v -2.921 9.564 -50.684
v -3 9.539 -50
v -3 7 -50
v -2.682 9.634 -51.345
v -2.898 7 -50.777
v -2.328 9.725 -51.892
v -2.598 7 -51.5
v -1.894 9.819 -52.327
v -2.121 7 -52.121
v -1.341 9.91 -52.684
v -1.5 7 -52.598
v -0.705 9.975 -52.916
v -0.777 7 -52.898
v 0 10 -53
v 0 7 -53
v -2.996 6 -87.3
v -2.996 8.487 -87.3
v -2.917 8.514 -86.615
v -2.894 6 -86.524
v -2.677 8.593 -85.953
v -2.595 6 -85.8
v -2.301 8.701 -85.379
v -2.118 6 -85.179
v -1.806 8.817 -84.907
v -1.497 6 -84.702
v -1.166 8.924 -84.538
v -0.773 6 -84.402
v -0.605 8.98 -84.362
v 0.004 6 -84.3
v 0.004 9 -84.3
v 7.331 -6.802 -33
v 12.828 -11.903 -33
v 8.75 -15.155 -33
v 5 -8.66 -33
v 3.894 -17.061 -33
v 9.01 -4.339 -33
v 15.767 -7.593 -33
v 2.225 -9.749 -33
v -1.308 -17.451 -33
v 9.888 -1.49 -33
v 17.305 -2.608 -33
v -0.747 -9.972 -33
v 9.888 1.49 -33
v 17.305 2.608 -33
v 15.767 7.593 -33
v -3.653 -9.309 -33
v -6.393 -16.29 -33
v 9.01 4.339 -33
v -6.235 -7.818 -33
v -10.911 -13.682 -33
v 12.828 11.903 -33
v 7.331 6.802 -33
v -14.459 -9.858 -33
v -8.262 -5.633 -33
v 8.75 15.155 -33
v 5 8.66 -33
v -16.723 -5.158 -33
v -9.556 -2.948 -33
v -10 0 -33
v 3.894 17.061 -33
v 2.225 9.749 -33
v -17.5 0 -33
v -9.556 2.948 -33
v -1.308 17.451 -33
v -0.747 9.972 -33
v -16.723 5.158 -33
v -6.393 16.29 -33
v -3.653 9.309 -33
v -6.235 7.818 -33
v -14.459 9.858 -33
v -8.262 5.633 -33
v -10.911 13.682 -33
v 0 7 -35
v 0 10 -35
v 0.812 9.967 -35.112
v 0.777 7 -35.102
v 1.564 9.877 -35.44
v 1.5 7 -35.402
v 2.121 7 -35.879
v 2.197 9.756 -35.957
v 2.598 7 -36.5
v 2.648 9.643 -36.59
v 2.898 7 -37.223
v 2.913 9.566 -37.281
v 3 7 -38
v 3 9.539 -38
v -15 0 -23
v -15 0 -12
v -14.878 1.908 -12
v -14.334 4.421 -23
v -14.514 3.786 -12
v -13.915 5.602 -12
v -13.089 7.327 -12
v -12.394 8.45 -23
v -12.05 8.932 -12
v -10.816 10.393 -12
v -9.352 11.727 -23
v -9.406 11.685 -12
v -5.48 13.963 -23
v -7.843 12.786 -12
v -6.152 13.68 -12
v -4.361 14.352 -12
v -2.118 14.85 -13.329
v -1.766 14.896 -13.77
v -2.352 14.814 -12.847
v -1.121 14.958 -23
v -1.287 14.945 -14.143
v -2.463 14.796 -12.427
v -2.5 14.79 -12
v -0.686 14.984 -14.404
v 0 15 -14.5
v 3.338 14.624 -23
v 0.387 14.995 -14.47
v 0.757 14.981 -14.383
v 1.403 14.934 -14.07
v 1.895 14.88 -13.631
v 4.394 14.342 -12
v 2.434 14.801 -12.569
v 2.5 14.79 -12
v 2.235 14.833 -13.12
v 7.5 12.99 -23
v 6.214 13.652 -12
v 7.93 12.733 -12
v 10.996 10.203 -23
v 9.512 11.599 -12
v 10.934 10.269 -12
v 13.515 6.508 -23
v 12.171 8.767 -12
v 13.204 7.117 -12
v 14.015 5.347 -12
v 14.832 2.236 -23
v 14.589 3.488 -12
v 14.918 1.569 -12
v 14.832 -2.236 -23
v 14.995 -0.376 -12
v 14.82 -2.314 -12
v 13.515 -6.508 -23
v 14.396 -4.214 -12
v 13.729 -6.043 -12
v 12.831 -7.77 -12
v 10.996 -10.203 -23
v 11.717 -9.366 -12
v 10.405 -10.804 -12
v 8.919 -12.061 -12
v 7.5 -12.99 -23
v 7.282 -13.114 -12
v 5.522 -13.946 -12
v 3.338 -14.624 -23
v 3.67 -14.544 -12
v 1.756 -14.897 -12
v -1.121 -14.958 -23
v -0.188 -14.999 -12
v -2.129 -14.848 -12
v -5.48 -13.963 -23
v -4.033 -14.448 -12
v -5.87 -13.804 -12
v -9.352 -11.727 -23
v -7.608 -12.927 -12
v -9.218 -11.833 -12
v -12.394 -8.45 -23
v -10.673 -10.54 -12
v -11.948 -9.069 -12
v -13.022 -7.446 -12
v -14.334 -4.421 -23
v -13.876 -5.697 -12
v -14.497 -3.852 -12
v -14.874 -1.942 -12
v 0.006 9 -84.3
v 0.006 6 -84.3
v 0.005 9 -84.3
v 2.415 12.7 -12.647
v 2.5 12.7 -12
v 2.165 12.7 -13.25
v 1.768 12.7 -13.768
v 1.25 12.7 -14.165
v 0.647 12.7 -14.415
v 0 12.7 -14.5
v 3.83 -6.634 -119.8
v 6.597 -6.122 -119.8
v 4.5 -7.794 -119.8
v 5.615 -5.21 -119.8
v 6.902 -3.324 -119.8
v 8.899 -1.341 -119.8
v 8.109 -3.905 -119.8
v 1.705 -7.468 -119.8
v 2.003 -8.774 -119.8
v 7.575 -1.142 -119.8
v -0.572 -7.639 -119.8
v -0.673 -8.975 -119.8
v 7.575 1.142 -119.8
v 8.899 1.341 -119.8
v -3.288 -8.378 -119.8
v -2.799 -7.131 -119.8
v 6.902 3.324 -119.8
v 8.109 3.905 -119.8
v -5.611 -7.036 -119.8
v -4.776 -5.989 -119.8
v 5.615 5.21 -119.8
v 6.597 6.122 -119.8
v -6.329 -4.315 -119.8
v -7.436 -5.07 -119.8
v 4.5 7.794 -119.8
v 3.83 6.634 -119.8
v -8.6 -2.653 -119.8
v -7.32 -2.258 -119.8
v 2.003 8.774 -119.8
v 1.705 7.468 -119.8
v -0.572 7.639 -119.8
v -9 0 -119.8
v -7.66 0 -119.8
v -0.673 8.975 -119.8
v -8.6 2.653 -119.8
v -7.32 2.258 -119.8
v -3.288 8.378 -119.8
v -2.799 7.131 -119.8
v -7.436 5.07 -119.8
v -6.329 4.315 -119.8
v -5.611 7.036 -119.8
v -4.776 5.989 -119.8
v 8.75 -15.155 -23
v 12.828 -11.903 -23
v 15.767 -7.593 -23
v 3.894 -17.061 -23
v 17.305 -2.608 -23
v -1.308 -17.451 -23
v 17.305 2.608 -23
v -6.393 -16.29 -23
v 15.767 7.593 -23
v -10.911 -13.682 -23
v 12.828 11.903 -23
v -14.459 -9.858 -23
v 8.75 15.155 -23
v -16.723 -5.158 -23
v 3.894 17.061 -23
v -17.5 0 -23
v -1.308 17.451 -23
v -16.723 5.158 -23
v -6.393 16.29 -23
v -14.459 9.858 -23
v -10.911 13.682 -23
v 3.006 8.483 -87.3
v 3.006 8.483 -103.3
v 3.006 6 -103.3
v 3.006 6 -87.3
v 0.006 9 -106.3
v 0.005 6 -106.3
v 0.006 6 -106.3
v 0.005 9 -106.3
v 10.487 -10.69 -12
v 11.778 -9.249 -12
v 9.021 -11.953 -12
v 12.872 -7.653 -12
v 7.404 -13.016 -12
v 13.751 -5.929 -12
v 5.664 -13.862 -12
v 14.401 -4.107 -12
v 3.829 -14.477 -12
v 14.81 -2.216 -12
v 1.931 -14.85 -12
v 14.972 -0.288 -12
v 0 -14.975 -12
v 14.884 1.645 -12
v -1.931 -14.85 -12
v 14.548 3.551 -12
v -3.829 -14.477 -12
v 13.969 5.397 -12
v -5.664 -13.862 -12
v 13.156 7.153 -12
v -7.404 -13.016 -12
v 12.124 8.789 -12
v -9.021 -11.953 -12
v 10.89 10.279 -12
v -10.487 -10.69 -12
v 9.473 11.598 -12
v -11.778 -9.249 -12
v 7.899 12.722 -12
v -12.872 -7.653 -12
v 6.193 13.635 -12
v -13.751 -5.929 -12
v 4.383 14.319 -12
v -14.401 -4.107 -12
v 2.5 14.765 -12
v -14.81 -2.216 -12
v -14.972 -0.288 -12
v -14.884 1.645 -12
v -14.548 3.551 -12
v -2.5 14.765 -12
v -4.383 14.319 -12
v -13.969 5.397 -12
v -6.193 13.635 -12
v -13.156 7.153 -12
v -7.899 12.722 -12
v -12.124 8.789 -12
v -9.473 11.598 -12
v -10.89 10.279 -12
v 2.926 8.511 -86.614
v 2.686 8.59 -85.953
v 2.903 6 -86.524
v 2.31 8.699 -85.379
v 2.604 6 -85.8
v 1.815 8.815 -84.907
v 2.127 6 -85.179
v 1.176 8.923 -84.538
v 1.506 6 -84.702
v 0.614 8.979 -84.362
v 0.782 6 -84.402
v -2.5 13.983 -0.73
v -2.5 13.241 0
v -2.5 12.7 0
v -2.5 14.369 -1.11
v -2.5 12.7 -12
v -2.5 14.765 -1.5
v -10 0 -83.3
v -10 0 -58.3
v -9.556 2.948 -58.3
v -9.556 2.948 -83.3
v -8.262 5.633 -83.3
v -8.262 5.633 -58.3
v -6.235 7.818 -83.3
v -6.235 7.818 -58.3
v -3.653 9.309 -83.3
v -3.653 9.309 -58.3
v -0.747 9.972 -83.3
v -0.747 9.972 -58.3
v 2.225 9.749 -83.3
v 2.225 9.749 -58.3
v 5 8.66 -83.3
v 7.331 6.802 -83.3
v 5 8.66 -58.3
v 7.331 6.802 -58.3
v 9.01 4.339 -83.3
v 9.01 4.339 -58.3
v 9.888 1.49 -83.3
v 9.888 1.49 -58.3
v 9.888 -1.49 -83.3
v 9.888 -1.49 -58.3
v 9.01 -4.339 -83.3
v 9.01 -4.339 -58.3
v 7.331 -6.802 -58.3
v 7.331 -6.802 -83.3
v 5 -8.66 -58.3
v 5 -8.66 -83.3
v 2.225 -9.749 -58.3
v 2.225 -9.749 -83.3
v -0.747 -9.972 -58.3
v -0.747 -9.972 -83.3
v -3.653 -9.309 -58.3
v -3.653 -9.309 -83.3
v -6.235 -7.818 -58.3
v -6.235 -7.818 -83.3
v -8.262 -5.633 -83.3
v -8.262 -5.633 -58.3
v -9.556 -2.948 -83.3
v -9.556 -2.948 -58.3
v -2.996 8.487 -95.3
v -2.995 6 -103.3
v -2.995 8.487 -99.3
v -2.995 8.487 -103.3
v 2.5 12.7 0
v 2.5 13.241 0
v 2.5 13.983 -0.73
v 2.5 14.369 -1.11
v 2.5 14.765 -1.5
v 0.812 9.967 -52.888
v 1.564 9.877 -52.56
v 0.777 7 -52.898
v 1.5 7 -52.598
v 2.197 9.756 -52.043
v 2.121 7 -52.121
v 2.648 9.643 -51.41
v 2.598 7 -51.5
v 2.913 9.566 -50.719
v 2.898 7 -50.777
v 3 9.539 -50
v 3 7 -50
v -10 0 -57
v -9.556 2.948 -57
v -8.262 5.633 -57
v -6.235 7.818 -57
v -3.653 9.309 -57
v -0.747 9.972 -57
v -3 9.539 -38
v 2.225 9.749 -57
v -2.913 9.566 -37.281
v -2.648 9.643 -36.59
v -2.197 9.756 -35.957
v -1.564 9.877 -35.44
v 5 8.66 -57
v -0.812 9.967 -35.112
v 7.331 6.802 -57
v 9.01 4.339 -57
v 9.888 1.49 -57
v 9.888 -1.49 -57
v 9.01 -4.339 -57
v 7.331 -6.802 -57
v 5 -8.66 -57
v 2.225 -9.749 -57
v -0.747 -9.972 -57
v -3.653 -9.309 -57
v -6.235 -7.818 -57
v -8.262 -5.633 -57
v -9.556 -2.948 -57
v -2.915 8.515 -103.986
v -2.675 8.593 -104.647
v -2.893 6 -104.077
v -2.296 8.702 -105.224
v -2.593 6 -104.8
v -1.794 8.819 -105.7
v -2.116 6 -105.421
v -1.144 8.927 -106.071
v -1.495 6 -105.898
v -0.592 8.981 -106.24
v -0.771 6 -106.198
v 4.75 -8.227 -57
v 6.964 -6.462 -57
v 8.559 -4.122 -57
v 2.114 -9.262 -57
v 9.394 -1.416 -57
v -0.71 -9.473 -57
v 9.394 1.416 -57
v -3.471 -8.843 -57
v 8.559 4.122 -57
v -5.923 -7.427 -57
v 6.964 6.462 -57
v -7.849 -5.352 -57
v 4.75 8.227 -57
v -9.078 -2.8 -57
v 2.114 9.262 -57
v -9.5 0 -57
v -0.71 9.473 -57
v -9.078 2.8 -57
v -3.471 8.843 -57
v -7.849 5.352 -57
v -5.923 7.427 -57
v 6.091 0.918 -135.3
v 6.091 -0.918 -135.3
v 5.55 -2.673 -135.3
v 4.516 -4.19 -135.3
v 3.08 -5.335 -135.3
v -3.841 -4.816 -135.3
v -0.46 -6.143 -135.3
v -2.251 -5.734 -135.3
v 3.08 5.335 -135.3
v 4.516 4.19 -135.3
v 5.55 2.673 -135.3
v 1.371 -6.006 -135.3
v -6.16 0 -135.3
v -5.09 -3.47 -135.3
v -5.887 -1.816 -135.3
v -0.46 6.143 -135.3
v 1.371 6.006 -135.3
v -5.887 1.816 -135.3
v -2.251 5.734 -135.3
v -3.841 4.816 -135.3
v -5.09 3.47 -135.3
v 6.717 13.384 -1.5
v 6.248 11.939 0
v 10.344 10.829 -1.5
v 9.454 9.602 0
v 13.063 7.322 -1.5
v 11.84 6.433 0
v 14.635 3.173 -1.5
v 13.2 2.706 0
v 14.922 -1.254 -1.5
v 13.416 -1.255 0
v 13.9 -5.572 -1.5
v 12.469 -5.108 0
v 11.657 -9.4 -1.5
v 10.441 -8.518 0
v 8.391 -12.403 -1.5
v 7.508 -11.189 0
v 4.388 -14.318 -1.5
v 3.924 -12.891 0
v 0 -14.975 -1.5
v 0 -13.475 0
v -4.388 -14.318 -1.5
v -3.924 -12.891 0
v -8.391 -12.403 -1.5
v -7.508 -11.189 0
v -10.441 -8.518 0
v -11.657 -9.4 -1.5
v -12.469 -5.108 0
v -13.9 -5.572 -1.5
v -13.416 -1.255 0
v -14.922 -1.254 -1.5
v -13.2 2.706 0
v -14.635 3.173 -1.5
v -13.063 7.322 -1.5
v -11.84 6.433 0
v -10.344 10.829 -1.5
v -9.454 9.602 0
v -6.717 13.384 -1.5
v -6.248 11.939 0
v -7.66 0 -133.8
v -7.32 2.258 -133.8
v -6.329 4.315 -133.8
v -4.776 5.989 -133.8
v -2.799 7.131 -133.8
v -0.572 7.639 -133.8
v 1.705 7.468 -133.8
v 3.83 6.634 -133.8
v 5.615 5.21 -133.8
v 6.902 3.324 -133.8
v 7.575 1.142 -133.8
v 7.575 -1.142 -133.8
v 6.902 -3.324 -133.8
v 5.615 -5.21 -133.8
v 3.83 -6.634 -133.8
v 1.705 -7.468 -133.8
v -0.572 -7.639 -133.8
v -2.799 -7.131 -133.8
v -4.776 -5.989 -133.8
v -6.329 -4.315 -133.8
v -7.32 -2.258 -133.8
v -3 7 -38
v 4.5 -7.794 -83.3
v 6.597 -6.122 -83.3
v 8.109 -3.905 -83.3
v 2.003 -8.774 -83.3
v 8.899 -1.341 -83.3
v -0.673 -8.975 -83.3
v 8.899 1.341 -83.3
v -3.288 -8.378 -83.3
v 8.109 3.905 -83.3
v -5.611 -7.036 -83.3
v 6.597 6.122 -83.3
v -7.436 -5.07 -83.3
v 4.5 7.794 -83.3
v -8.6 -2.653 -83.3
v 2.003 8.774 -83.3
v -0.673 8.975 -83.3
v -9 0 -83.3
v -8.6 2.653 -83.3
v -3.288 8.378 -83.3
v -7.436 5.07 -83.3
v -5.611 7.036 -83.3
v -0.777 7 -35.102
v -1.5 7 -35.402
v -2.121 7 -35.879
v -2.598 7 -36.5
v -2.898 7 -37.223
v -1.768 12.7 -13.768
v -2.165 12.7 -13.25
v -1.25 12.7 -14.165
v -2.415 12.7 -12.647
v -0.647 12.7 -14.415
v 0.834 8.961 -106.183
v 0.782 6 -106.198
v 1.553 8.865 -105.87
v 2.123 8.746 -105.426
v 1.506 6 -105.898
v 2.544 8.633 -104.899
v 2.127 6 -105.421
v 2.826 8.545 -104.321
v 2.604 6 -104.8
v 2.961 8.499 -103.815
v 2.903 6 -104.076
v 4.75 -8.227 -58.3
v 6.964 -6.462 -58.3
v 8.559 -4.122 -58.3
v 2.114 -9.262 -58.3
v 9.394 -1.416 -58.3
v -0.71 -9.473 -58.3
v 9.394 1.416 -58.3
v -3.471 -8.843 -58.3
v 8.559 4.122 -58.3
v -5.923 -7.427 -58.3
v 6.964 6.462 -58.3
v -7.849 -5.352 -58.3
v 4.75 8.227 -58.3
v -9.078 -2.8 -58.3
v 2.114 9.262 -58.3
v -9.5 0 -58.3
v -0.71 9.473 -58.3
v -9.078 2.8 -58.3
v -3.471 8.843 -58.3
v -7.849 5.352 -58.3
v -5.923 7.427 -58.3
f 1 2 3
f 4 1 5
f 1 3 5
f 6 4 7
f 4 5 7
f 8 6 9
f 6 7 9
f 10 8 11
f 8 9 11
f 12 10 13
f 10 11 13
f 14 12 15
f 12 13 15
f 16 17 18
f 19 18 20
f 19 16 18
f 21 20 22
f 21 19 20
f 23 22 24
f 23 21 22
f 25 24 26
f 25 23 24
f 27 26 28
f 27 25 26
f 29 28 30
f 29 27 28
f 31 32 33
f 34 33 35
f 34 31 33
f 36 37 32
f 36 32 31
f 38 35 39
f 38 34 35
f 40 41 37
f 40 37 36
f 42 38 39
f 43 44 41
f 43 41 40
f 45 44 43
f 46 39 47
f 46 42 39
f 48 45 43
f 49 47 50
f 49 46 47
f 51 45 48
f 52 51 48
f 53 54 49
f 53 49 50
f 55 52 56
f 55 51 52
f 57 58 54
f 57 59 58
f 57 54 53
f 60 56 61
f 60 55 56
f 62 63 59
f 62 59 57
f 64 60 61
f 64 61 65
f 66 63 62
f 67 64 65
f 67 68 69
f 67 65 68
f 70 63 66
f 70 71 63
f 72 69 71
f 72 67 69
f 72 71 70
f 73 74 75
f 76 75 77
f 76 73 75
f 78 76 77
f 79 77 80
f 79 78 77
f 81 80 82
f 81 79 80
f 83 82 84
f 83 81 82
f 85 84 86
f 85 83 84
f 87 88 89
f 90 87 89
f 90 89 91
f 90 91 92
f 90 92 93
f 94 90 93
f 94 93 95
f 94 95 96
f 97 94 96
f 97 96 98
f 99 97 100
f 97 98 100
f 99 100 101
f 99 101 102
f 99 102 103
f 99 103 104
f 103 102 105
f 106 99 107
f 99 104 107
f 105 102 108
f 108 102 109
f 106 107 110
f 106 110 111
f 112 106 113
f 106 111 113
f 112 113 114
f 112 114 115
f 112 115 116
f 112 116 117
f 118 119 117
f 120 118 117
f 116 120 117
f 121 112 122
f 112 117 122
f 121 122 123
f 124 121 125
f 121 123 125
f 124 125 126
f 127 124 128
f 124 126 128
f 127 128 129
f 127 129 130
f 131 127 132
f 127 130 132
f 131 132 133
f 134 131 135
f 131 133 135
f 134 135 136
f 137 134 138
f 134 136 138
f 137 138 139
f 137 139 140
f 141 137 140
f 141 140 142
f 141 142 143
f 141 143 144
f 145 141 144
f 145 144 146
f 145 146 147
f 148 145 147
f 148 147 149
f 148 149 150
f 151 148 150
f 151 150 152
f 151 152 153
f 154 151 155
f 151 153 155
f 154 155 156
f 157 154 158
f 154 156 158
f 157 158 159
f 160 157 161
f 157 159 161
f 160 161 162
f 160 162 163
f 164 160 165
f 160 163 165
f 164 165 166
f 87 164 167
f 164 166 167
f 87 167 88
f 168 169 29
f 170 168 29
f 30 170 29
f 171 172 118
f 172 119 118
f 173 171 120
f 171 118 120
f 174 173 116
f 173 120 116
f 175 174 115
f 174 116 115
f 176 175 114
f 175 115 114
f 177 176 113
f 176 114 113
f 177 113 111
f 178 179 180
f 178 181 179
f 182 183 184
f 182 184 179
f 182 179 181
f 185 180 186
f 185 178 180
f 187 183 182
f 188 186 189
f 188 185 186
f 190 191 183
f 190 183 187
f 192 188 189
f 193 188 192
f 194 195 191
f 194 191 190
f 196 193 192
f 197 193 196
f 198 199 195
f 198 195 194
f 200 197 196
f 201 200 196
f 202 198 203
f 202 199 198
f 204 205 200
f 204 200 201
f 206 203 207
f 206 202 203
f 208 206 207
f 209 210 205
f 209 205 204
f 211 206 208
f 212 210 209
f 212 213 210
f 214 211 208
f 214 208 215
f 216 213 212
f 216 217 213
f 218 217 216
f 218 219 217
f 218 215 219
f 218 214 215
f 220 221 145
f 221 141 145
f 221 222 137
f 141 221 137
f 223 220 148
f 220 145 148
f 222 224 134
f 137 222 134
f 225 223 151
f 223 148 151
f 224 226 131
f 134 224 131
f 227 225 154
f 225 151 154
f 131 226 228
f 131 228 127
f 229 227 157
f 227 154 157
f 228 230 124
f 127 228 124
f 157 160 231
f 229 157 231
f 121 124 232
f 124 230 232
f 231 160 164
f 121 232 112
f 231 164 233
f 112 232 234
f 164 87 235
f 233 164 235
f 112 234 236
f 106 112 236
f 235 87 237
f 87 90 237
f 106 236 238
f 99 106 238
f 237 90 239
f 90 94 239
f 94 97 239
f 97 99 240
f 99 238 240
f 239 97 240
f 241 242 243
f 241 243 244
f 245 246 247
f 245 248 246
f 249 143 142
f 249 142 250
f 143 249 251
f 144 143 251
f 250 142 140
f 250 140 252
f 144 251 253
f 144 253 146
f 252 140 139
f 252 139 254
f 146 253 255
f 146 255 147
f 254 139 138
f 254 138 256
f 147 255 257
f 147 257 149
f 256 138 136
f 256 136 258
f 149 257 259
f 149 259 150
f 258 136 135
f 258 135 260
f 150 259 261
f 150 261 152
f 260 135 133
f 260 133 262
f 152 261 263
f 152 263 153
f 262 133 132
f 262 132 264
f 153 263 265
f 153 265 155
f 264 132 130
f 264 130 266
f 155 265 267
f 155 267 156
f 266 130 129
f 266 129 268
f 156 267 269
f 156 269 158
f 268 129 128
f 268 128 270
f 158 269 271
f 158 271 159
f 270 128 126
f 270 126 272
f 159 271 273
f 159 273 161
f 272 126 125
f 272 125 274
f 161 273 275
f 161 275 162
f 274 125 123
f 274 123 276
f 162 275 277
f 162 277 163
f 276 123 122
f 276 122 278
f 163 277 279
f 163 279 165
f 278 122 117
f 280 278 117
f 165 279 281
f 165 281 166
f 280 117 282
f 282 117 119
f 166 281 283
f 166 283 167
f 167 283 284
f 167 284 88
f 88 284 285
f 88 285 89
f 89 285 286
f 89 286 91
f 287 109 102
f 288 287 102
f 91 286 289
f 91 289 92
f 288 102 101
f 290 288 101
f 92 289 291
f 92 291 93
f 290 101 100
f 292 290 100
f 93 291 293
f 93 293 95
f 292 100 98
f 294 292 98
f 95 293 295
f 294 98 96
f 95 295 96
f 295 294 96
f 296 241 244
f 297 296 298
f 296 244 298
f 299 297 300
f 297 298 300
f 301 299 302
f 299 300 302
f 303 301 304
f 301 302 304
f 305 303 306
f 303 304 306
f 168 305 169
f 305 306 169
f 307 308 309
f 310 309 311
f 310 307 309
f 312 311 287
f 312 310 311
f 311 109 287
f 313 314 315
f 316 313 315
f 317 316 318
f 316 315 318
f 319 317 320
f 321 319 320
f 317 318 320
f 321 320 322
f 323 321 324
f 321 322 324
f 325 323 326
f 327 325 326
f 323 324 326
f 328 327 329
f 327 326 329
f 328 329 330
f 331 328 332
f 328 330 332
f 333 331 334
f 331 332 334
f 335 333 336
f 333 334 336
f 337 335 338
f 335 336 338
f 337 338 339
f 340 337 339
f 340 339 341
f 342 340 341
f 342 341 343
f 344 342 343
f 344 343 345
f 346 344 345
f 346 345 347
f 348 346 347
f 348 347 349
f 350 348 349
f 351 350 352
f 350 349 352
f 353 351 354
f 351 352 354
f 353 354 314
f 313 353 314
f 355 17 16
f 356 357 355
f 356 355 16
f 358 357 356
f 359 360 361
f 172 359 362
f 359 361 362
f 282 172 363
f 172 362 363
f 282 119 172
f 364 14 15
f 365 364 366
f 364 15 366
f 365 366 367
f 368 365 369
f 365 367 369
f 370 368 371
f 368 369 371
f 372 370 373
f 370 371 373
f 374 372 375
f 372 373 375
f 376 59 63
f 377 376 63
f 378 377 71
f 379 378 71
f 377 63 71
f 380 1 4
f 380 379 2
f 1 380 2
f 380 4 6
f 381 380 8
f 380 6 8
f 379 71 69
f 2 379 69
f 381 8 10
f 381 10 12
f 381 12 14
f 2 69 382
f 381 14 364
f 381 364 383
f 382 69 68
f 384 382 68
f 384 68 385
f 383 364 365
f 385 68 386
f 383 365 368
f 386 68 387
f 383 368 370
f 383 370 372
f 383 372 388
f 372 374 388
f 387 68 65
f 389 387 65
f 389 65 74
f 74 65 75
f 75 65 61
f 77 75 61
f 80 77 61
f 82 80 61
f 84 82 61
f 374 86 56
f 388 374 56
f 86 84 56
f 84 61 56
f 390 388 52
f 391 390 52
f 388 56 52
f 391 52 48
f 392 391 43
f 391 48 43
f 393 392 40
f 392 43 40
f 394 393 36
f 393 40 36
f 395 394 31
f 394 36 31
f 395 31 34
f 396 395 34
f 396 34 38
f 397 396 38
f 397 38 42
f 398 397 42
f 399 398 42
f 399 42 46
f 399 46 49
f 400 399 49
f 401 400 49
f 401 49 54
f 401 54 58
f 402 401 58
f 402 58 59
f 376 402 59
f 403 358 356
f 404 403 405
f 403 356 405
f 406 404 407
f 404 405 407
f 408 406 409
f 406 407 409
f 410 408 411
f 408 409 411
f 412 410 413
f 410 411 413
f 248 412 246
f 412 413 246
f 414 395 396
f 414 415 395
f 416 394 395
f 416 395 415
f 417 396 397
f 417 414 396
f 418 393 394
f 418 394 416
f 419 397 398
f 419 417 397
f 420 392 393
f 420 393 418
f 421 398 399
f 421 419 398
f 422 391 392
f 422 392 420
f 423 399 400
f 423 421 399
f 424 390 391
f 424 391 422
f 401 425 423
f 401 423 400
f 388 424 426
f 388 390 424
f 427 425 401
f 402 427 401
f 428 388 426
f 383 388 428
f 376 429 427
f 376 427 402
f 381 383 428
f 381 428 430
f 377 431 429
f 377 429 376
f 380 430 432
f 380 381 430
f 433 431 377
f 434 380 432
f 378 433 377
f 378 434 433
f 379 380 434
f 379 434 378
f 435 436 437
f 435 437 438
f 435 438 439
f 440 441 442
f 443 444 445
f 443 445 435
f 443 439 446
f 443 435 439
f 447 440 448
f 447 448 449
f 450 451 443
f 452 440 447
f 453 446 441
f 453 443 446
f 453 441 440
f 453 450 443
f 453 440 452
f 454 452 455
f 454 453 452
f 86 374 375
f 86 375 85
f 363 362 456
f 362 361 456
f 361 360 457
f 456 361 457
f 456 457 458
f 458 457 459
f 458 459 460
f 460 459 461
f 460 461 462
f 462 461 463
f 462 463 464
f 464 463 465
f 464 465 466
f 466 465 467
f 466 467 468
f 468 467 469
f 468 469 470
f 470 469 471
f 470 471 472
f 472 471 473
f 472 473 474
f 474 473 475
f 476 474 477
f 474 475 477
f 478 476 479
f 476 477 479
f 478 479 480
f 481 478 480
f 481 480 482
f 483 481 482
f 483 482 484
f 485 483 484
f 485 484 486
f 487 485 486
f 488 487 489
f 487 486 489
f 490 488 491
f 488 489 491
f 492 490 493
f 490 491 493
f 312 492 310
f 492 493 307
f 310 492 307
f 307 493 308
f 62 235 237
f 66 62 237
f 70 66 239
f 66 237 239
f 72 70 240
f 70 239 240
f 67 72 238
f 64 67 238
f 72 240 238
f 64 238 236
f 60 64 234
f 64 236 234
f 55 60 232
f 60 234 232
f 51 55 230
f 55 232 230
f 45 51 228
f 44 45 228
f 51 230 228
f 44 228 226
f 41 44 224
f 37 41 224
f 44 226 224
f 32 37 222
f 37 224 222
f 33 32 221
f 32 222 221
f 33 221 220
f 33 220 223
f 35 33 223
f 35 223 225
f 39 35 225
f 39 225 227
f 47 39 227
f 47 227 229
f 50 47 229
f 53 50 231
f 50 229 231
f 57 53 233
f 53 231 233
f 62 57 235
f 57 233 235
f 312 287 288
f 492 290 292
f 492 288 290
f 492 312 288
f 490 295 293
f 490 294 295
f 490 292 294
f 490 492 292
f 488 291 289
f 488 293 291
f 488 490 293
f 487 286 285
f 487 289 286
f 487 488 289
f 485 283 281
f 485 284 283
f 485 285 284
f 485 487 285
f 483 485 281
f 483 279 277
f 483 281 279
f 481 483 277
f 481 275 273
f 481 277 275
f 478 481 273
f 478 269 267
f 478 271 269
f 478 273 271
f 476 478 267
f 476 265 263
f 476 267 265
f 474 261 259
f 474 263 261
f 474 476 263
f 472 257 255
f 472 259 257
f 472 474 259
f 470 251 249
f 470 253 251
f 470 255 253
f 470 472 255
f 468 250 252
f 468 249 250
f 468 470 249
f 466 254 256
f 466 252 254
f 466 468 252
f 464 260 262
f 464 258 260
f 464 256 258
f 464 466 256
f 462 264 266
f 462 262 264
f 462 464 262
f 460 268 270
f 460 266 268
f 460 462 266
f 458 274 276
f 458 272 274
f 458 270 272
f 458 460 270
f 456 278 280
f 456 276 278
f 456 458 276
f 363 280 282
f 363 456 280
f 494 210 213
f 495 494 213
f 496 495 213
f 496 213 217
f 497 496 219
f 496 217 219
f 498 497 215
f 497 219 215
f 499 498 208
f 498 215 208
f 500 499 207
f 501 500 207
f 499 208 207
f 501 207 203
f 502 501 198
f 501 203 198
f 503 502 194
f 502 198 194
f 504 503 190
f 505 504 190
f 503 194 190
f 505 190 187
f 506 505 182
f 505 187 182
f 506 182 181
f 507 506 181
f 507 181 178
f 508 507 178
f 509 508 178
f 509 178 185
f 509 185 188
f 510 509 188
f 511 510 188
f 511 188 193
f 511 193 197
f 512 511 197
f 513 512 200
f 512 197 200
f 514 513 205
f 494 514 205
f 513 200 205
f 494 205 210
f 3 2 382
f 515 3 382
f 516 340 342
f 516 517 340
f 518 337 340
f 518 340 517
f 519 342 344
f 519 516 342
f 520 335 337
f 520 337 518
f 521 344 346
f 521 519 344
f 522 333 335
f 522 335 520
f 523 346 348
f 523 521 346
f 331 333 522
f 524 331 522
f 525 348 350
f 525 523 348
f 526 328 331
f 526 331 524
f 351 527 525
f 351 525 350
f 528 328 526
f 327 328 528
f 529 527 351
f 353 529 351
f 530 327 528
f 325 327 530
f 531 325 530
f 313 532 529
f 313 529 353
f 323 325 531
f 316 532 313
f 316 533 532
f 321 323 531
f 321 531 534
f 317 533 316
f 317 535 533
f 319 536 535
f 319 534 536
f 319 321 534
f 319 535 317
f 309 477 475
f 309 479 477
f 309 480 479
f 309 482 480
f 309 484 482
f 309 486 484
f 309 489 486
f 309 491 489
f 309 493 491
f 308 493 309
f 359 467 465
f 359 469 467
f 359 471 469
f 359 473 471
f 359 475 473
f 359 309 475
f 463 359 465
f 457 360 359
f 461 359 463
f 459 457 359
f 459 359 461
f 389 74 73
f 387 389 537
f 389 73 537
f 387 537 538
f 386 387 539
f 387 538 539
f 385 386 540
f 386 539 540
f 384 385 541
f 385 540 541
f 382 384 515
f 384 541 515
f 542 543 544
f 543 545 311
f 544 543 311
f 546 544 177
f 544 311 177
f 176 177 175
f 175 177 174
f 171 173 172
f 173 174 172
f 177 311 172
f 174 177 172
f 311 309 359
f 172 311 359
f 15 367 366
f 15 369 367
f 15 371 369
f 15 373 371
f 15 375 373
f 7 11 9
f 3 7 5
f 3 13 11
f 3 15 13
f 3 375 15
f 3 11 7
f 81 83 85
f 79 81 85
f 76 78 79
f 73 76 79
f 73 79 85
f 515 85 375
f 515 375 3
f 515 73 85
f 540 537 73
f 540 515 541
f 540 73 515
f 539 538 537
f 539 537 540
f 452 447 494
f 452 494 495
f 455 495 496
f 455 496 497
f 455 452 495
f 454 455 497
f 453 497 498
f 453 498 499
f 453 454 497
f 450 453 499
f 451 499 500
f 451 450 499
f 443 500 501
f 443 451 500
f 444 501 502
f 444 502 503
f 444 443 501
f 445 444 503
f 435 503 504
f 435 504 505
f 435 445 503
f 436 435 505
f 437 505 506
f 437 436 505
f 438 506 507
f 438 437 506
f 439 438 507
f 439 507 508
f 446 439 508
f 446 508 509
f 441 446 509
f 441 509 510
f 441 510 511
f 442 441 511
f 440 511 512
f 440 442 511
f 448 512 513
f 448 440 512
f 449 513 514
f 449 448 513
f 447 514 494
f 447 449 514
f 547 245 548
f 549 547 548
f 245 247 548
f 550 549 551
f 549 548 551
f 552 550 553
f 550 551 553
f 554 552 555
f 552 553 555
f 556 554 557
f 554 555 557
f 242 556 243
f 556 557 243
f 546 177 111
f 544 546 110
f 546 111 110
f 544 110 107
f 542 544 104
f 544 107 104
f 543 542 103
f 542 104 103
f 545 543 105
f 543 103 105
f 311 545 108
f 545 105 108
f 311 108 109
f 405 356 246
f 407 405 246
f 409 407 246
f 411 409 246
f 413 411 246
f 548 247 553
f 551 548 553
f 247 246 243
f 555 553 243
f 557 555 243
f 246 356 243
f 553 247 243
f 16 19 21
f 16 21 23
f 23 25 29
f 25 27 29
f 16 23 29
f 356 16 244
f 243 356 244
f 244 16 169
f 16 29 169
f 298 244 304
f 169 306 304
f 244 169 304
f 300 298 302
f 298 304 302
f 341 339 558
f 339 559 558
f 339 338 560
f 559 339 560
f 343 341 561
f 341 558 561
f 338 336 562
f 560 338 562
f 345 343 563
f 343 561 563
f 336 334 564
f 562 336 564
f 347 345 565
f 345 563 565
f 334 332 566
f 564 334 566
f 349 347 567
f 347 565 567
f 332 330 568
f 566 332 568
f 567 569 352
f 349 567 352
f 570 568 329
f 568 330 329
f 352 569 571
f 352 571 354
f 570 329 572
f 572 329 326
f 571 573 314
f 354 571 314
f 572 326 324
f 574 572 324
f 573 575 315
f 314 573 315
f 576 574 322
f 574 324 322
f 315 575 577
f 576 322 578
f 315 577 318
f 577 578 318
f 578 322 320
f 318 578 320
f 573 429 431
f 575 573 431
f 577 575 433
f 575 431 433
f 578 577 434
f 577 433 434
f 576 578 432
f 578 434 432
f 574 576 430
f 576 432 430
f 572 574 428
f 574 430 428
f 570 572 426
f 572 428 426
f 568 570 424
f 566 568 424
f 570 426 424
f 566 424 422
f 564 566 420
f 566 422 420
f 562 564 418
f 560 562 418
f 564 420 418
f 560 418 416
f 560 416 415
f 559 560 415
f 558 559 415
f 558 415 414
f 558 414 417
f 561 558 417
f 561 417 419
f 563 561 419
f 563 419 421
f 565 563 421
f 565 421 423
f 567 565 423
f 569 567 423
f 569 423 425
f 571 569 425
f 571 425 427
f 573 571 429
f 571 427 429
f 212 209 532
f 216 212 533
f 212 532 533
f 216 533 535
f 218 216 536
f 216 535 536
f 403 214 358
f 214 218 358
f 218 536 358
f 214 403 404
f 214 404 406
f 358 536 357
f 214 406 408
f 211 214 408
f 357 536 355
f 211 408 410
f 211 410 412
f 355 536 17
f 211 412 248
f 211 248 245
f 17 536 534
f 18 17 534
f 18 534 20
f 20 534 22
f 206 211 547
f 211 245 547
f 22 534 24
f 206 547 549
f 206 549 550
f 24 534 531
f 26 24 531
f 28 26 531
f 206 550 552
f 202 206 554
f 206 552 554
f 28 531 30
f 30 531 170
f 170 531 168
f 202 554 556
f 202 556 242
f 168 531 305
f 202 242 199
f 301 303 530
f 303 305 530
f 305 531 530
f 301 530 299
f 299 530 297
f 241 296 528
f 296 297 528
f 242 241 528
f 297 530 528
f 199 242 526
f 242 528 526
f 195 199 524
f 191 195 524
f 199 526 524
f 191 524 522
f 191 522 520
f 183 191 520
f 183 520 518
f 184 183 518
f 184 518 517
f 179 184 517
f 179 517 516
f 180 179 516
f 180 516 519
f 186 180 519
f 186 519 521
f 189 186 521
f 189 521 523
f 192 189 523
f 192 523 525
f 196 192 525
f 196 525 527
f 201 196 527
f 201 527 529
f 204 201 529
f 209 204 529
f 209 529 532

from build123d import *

# Parameters (mm, degrees)
SKETCH1_R          = 14.975
EXTRUDE1_DEPTH     = 12
SKETCH2_R          = 15
EXTRUDE2_DEPTH     = 11
SKETCH3_R          = 17.5
EXTRUDE3_DEPTH     = 10
SKETCH4_R          = 10
EXTRUDE4_DEPTH     = 24
SKETCH5_R          = 9.5
EXTRUDE5_DEPTH     = 1.3
SKETCH6_R          = 10
EXTRUDE6_DEPTH     = 25
SKETCH7_R          = 9
EXTRUDE7_DEPTH     = 36.5
SKETCH8_R          = 7.660195653
EXTRUDE8_DEPTH     = 15.5
SKETCH9_W          = 5
SKETCH9_H          = 5.185185185
CUT_EXTRUDE1_DEPTH = 14.5
FILLET1_R          = 2.5
CHAMFER1_SIZE      = 1.5
SKETCH10_W         = 6
SKETCH10_H         = 18
CUT_EXTRUDE2_DEPTH = 3
FILLET2_R          = 3
CUT_EXTRUDE3_DEPTH = 3
FILLET3_R          = 3
CHAMFER2_SIZE      = 1.5


with BuildPart() as part:
    # Sketch1 → Extrude1 (new body)
    with BuildSketch(Plane.XY):
        Circle(SKETCH1_R)
    extrude(amount=-EXTRUDE1_DEPTH)

    # Sketch2 → Extrude2 (add)
    with BuildSketch(Plane(origin=(0, 0, -12), x_dir=(-1, 0, 0), z_dir=(0, 0, -1))):
        Circle(SKETCH2_R)
    extrude(amount=EXTRUDE2_DEPTH)

    # Sketch3 → Extrude3 (add)
    with BuildSketch(Plane(origin=(0, 0, -23), x_dir=(-1, 0, 0), z_dir=(0, 0, -1))):
        Circle(SKETCH3_R)
    extrude(amount=EXTRUDE3_DEPTH)

    # Sketch4 → Extrude4 (add)
    with BuildSketch(Plane(origin=(0, 0, -33), x_dir=(-1, 0, 0), z_dir=(0, 0, -1))):
        Circle(SKETCH4_R)
    extrude(amount=EXTRUDE4_DEPTH)

    # Sketch5 → Extrude5 (add)
    with BuildSketch(Plane(origin=(0, 0, -57), x_dir=(-1, 0, 0), z_dir=(0, 0, -1))):
        Circle(SKETCH5_R)
    extrude(amount=EXTRUDE5_DEPTH)

    # Sketch6 → Extrude6 (add)
    with BuildSketch(Plane(origin=(0, 0, -58.3), x_dir=(-1, 0, 0), z_dir=(0, 0, -1))):
        Circle(SKETCH6_R)
    extrude(amount=EXTRUDE6_DEPTH)

    # Sketch7 → Extrude7 (add)
    with BuildSketch(Plane(origin=(0, 0, -83.3), x_dir=(-1, 0, 0), z_dir=(0, 0, -1))):
        Circle(SKETCH7_R)
    extrude(amount=EXTRUDE7_DEPTH)

    # Sketch8 → Extrude8 (add)
    with BuildSketch(Plane(origin=(0, 0, -119.8), x_dir=(-1, 0, 0), z_dir=(0, 0, -1))):
        Circle(SKETCH8_R)
    extrude(amount=EXTRUDE8_DEPTH)

    # Sketch9 → Cut-Extrude1 (cut)
    with BuildSketch(Plane.XY):
        with Locations((0, 15.292592593)):
            Rectangle(SKETCH9_W, SKETCH9_H)
    extrude(amount=-CUT_EXTRUDE1_DEPTH, mode=Mode.SUBTRACT)

    # Fillet1
    fillet1_edges = [part.edges().sort_by_distance(p)[0] for p in [
        (2.5, 13.745099729, -14.5),
        (-2.5, 13.745099729, -14.5),
    ]]
    fillet(fillet1_edges, radius=FILLET1_R - 0.0001)  # a hair under: the kernel refuses the full size

    # Chamfer1
    chamfer1_edges = [part.edges().sort_by_distance(p)[0] for p in [
        (0, -14.975, 0),
    ]]
    chamfer(chamfer1_edges, length=CHAMFER1_SIZE)

    # Sketch10 → Cut-Extrude2 (cut)
    with BuildSketch(Plane(origin=(0, 10, 0), x_dir=(-1, 0, 0), z_dir=(0, 1, 0))):
        with Locations((0, -44)):
            Rectangle(SKETCH10_W, SKETCH10_H)
    extrude(amount=-CUT_EXTRUDE2_DEPTH, mode=Mode.SUBTRACT)

    # Fillet2
    fillet2_edges = [part.edges().sort_by_distance(p)[0] for p in [
        (3, 8.269696007, -53),
        (-3, 8.269696007, -53),
        (-3, 8.269696007, -35),
        (3, 8.269696007, -35),
    ]]
    fillet(fillet2_edges, radius=FILLET2_R - 0.0001)  # a hair under: the kernel refuses the full size

    # Sketch11 → Cut-Extrude3 (cut)
    with BuildSketch(Plane(origin=(0, 9, 0), x_dir=(-1, 0, 0), z_dir=(0, 1, 0))):
        Polygon((-3.005512872, -84.3), (2.996762617, -84.3), (2.994487128, -106.299999882), (-3.005512872, -106.3), align=None)
    extrude(amount=-CUT_EXTRUDE3_DEPTH, mode=Mode.SUBTRACT)

    # Fillet3
    fillet3_edges = [part.edges().sort_by_distance(p)[0] for p in [
        (-2.994487128, 7.243614227, -106.299999882),
        (3.005512872, 7.241665132, -106.3),
        (3.005512872, 7.241665132, -84.3),
        (-2.996762617, 7.243212634, -84.3),
    ]]
    fillet(fillet3_edges, radius=FILLET3_R)

    # Chamfer2
    chamfer2_edges = [part.edges().sort_by_distance(p)[0] for p in [
        (7.660195653, 0, -135.3),
    ]]
    chamfer(chamfer2_edges, length=CHAMFER2_SIZE)


solid = part.part
